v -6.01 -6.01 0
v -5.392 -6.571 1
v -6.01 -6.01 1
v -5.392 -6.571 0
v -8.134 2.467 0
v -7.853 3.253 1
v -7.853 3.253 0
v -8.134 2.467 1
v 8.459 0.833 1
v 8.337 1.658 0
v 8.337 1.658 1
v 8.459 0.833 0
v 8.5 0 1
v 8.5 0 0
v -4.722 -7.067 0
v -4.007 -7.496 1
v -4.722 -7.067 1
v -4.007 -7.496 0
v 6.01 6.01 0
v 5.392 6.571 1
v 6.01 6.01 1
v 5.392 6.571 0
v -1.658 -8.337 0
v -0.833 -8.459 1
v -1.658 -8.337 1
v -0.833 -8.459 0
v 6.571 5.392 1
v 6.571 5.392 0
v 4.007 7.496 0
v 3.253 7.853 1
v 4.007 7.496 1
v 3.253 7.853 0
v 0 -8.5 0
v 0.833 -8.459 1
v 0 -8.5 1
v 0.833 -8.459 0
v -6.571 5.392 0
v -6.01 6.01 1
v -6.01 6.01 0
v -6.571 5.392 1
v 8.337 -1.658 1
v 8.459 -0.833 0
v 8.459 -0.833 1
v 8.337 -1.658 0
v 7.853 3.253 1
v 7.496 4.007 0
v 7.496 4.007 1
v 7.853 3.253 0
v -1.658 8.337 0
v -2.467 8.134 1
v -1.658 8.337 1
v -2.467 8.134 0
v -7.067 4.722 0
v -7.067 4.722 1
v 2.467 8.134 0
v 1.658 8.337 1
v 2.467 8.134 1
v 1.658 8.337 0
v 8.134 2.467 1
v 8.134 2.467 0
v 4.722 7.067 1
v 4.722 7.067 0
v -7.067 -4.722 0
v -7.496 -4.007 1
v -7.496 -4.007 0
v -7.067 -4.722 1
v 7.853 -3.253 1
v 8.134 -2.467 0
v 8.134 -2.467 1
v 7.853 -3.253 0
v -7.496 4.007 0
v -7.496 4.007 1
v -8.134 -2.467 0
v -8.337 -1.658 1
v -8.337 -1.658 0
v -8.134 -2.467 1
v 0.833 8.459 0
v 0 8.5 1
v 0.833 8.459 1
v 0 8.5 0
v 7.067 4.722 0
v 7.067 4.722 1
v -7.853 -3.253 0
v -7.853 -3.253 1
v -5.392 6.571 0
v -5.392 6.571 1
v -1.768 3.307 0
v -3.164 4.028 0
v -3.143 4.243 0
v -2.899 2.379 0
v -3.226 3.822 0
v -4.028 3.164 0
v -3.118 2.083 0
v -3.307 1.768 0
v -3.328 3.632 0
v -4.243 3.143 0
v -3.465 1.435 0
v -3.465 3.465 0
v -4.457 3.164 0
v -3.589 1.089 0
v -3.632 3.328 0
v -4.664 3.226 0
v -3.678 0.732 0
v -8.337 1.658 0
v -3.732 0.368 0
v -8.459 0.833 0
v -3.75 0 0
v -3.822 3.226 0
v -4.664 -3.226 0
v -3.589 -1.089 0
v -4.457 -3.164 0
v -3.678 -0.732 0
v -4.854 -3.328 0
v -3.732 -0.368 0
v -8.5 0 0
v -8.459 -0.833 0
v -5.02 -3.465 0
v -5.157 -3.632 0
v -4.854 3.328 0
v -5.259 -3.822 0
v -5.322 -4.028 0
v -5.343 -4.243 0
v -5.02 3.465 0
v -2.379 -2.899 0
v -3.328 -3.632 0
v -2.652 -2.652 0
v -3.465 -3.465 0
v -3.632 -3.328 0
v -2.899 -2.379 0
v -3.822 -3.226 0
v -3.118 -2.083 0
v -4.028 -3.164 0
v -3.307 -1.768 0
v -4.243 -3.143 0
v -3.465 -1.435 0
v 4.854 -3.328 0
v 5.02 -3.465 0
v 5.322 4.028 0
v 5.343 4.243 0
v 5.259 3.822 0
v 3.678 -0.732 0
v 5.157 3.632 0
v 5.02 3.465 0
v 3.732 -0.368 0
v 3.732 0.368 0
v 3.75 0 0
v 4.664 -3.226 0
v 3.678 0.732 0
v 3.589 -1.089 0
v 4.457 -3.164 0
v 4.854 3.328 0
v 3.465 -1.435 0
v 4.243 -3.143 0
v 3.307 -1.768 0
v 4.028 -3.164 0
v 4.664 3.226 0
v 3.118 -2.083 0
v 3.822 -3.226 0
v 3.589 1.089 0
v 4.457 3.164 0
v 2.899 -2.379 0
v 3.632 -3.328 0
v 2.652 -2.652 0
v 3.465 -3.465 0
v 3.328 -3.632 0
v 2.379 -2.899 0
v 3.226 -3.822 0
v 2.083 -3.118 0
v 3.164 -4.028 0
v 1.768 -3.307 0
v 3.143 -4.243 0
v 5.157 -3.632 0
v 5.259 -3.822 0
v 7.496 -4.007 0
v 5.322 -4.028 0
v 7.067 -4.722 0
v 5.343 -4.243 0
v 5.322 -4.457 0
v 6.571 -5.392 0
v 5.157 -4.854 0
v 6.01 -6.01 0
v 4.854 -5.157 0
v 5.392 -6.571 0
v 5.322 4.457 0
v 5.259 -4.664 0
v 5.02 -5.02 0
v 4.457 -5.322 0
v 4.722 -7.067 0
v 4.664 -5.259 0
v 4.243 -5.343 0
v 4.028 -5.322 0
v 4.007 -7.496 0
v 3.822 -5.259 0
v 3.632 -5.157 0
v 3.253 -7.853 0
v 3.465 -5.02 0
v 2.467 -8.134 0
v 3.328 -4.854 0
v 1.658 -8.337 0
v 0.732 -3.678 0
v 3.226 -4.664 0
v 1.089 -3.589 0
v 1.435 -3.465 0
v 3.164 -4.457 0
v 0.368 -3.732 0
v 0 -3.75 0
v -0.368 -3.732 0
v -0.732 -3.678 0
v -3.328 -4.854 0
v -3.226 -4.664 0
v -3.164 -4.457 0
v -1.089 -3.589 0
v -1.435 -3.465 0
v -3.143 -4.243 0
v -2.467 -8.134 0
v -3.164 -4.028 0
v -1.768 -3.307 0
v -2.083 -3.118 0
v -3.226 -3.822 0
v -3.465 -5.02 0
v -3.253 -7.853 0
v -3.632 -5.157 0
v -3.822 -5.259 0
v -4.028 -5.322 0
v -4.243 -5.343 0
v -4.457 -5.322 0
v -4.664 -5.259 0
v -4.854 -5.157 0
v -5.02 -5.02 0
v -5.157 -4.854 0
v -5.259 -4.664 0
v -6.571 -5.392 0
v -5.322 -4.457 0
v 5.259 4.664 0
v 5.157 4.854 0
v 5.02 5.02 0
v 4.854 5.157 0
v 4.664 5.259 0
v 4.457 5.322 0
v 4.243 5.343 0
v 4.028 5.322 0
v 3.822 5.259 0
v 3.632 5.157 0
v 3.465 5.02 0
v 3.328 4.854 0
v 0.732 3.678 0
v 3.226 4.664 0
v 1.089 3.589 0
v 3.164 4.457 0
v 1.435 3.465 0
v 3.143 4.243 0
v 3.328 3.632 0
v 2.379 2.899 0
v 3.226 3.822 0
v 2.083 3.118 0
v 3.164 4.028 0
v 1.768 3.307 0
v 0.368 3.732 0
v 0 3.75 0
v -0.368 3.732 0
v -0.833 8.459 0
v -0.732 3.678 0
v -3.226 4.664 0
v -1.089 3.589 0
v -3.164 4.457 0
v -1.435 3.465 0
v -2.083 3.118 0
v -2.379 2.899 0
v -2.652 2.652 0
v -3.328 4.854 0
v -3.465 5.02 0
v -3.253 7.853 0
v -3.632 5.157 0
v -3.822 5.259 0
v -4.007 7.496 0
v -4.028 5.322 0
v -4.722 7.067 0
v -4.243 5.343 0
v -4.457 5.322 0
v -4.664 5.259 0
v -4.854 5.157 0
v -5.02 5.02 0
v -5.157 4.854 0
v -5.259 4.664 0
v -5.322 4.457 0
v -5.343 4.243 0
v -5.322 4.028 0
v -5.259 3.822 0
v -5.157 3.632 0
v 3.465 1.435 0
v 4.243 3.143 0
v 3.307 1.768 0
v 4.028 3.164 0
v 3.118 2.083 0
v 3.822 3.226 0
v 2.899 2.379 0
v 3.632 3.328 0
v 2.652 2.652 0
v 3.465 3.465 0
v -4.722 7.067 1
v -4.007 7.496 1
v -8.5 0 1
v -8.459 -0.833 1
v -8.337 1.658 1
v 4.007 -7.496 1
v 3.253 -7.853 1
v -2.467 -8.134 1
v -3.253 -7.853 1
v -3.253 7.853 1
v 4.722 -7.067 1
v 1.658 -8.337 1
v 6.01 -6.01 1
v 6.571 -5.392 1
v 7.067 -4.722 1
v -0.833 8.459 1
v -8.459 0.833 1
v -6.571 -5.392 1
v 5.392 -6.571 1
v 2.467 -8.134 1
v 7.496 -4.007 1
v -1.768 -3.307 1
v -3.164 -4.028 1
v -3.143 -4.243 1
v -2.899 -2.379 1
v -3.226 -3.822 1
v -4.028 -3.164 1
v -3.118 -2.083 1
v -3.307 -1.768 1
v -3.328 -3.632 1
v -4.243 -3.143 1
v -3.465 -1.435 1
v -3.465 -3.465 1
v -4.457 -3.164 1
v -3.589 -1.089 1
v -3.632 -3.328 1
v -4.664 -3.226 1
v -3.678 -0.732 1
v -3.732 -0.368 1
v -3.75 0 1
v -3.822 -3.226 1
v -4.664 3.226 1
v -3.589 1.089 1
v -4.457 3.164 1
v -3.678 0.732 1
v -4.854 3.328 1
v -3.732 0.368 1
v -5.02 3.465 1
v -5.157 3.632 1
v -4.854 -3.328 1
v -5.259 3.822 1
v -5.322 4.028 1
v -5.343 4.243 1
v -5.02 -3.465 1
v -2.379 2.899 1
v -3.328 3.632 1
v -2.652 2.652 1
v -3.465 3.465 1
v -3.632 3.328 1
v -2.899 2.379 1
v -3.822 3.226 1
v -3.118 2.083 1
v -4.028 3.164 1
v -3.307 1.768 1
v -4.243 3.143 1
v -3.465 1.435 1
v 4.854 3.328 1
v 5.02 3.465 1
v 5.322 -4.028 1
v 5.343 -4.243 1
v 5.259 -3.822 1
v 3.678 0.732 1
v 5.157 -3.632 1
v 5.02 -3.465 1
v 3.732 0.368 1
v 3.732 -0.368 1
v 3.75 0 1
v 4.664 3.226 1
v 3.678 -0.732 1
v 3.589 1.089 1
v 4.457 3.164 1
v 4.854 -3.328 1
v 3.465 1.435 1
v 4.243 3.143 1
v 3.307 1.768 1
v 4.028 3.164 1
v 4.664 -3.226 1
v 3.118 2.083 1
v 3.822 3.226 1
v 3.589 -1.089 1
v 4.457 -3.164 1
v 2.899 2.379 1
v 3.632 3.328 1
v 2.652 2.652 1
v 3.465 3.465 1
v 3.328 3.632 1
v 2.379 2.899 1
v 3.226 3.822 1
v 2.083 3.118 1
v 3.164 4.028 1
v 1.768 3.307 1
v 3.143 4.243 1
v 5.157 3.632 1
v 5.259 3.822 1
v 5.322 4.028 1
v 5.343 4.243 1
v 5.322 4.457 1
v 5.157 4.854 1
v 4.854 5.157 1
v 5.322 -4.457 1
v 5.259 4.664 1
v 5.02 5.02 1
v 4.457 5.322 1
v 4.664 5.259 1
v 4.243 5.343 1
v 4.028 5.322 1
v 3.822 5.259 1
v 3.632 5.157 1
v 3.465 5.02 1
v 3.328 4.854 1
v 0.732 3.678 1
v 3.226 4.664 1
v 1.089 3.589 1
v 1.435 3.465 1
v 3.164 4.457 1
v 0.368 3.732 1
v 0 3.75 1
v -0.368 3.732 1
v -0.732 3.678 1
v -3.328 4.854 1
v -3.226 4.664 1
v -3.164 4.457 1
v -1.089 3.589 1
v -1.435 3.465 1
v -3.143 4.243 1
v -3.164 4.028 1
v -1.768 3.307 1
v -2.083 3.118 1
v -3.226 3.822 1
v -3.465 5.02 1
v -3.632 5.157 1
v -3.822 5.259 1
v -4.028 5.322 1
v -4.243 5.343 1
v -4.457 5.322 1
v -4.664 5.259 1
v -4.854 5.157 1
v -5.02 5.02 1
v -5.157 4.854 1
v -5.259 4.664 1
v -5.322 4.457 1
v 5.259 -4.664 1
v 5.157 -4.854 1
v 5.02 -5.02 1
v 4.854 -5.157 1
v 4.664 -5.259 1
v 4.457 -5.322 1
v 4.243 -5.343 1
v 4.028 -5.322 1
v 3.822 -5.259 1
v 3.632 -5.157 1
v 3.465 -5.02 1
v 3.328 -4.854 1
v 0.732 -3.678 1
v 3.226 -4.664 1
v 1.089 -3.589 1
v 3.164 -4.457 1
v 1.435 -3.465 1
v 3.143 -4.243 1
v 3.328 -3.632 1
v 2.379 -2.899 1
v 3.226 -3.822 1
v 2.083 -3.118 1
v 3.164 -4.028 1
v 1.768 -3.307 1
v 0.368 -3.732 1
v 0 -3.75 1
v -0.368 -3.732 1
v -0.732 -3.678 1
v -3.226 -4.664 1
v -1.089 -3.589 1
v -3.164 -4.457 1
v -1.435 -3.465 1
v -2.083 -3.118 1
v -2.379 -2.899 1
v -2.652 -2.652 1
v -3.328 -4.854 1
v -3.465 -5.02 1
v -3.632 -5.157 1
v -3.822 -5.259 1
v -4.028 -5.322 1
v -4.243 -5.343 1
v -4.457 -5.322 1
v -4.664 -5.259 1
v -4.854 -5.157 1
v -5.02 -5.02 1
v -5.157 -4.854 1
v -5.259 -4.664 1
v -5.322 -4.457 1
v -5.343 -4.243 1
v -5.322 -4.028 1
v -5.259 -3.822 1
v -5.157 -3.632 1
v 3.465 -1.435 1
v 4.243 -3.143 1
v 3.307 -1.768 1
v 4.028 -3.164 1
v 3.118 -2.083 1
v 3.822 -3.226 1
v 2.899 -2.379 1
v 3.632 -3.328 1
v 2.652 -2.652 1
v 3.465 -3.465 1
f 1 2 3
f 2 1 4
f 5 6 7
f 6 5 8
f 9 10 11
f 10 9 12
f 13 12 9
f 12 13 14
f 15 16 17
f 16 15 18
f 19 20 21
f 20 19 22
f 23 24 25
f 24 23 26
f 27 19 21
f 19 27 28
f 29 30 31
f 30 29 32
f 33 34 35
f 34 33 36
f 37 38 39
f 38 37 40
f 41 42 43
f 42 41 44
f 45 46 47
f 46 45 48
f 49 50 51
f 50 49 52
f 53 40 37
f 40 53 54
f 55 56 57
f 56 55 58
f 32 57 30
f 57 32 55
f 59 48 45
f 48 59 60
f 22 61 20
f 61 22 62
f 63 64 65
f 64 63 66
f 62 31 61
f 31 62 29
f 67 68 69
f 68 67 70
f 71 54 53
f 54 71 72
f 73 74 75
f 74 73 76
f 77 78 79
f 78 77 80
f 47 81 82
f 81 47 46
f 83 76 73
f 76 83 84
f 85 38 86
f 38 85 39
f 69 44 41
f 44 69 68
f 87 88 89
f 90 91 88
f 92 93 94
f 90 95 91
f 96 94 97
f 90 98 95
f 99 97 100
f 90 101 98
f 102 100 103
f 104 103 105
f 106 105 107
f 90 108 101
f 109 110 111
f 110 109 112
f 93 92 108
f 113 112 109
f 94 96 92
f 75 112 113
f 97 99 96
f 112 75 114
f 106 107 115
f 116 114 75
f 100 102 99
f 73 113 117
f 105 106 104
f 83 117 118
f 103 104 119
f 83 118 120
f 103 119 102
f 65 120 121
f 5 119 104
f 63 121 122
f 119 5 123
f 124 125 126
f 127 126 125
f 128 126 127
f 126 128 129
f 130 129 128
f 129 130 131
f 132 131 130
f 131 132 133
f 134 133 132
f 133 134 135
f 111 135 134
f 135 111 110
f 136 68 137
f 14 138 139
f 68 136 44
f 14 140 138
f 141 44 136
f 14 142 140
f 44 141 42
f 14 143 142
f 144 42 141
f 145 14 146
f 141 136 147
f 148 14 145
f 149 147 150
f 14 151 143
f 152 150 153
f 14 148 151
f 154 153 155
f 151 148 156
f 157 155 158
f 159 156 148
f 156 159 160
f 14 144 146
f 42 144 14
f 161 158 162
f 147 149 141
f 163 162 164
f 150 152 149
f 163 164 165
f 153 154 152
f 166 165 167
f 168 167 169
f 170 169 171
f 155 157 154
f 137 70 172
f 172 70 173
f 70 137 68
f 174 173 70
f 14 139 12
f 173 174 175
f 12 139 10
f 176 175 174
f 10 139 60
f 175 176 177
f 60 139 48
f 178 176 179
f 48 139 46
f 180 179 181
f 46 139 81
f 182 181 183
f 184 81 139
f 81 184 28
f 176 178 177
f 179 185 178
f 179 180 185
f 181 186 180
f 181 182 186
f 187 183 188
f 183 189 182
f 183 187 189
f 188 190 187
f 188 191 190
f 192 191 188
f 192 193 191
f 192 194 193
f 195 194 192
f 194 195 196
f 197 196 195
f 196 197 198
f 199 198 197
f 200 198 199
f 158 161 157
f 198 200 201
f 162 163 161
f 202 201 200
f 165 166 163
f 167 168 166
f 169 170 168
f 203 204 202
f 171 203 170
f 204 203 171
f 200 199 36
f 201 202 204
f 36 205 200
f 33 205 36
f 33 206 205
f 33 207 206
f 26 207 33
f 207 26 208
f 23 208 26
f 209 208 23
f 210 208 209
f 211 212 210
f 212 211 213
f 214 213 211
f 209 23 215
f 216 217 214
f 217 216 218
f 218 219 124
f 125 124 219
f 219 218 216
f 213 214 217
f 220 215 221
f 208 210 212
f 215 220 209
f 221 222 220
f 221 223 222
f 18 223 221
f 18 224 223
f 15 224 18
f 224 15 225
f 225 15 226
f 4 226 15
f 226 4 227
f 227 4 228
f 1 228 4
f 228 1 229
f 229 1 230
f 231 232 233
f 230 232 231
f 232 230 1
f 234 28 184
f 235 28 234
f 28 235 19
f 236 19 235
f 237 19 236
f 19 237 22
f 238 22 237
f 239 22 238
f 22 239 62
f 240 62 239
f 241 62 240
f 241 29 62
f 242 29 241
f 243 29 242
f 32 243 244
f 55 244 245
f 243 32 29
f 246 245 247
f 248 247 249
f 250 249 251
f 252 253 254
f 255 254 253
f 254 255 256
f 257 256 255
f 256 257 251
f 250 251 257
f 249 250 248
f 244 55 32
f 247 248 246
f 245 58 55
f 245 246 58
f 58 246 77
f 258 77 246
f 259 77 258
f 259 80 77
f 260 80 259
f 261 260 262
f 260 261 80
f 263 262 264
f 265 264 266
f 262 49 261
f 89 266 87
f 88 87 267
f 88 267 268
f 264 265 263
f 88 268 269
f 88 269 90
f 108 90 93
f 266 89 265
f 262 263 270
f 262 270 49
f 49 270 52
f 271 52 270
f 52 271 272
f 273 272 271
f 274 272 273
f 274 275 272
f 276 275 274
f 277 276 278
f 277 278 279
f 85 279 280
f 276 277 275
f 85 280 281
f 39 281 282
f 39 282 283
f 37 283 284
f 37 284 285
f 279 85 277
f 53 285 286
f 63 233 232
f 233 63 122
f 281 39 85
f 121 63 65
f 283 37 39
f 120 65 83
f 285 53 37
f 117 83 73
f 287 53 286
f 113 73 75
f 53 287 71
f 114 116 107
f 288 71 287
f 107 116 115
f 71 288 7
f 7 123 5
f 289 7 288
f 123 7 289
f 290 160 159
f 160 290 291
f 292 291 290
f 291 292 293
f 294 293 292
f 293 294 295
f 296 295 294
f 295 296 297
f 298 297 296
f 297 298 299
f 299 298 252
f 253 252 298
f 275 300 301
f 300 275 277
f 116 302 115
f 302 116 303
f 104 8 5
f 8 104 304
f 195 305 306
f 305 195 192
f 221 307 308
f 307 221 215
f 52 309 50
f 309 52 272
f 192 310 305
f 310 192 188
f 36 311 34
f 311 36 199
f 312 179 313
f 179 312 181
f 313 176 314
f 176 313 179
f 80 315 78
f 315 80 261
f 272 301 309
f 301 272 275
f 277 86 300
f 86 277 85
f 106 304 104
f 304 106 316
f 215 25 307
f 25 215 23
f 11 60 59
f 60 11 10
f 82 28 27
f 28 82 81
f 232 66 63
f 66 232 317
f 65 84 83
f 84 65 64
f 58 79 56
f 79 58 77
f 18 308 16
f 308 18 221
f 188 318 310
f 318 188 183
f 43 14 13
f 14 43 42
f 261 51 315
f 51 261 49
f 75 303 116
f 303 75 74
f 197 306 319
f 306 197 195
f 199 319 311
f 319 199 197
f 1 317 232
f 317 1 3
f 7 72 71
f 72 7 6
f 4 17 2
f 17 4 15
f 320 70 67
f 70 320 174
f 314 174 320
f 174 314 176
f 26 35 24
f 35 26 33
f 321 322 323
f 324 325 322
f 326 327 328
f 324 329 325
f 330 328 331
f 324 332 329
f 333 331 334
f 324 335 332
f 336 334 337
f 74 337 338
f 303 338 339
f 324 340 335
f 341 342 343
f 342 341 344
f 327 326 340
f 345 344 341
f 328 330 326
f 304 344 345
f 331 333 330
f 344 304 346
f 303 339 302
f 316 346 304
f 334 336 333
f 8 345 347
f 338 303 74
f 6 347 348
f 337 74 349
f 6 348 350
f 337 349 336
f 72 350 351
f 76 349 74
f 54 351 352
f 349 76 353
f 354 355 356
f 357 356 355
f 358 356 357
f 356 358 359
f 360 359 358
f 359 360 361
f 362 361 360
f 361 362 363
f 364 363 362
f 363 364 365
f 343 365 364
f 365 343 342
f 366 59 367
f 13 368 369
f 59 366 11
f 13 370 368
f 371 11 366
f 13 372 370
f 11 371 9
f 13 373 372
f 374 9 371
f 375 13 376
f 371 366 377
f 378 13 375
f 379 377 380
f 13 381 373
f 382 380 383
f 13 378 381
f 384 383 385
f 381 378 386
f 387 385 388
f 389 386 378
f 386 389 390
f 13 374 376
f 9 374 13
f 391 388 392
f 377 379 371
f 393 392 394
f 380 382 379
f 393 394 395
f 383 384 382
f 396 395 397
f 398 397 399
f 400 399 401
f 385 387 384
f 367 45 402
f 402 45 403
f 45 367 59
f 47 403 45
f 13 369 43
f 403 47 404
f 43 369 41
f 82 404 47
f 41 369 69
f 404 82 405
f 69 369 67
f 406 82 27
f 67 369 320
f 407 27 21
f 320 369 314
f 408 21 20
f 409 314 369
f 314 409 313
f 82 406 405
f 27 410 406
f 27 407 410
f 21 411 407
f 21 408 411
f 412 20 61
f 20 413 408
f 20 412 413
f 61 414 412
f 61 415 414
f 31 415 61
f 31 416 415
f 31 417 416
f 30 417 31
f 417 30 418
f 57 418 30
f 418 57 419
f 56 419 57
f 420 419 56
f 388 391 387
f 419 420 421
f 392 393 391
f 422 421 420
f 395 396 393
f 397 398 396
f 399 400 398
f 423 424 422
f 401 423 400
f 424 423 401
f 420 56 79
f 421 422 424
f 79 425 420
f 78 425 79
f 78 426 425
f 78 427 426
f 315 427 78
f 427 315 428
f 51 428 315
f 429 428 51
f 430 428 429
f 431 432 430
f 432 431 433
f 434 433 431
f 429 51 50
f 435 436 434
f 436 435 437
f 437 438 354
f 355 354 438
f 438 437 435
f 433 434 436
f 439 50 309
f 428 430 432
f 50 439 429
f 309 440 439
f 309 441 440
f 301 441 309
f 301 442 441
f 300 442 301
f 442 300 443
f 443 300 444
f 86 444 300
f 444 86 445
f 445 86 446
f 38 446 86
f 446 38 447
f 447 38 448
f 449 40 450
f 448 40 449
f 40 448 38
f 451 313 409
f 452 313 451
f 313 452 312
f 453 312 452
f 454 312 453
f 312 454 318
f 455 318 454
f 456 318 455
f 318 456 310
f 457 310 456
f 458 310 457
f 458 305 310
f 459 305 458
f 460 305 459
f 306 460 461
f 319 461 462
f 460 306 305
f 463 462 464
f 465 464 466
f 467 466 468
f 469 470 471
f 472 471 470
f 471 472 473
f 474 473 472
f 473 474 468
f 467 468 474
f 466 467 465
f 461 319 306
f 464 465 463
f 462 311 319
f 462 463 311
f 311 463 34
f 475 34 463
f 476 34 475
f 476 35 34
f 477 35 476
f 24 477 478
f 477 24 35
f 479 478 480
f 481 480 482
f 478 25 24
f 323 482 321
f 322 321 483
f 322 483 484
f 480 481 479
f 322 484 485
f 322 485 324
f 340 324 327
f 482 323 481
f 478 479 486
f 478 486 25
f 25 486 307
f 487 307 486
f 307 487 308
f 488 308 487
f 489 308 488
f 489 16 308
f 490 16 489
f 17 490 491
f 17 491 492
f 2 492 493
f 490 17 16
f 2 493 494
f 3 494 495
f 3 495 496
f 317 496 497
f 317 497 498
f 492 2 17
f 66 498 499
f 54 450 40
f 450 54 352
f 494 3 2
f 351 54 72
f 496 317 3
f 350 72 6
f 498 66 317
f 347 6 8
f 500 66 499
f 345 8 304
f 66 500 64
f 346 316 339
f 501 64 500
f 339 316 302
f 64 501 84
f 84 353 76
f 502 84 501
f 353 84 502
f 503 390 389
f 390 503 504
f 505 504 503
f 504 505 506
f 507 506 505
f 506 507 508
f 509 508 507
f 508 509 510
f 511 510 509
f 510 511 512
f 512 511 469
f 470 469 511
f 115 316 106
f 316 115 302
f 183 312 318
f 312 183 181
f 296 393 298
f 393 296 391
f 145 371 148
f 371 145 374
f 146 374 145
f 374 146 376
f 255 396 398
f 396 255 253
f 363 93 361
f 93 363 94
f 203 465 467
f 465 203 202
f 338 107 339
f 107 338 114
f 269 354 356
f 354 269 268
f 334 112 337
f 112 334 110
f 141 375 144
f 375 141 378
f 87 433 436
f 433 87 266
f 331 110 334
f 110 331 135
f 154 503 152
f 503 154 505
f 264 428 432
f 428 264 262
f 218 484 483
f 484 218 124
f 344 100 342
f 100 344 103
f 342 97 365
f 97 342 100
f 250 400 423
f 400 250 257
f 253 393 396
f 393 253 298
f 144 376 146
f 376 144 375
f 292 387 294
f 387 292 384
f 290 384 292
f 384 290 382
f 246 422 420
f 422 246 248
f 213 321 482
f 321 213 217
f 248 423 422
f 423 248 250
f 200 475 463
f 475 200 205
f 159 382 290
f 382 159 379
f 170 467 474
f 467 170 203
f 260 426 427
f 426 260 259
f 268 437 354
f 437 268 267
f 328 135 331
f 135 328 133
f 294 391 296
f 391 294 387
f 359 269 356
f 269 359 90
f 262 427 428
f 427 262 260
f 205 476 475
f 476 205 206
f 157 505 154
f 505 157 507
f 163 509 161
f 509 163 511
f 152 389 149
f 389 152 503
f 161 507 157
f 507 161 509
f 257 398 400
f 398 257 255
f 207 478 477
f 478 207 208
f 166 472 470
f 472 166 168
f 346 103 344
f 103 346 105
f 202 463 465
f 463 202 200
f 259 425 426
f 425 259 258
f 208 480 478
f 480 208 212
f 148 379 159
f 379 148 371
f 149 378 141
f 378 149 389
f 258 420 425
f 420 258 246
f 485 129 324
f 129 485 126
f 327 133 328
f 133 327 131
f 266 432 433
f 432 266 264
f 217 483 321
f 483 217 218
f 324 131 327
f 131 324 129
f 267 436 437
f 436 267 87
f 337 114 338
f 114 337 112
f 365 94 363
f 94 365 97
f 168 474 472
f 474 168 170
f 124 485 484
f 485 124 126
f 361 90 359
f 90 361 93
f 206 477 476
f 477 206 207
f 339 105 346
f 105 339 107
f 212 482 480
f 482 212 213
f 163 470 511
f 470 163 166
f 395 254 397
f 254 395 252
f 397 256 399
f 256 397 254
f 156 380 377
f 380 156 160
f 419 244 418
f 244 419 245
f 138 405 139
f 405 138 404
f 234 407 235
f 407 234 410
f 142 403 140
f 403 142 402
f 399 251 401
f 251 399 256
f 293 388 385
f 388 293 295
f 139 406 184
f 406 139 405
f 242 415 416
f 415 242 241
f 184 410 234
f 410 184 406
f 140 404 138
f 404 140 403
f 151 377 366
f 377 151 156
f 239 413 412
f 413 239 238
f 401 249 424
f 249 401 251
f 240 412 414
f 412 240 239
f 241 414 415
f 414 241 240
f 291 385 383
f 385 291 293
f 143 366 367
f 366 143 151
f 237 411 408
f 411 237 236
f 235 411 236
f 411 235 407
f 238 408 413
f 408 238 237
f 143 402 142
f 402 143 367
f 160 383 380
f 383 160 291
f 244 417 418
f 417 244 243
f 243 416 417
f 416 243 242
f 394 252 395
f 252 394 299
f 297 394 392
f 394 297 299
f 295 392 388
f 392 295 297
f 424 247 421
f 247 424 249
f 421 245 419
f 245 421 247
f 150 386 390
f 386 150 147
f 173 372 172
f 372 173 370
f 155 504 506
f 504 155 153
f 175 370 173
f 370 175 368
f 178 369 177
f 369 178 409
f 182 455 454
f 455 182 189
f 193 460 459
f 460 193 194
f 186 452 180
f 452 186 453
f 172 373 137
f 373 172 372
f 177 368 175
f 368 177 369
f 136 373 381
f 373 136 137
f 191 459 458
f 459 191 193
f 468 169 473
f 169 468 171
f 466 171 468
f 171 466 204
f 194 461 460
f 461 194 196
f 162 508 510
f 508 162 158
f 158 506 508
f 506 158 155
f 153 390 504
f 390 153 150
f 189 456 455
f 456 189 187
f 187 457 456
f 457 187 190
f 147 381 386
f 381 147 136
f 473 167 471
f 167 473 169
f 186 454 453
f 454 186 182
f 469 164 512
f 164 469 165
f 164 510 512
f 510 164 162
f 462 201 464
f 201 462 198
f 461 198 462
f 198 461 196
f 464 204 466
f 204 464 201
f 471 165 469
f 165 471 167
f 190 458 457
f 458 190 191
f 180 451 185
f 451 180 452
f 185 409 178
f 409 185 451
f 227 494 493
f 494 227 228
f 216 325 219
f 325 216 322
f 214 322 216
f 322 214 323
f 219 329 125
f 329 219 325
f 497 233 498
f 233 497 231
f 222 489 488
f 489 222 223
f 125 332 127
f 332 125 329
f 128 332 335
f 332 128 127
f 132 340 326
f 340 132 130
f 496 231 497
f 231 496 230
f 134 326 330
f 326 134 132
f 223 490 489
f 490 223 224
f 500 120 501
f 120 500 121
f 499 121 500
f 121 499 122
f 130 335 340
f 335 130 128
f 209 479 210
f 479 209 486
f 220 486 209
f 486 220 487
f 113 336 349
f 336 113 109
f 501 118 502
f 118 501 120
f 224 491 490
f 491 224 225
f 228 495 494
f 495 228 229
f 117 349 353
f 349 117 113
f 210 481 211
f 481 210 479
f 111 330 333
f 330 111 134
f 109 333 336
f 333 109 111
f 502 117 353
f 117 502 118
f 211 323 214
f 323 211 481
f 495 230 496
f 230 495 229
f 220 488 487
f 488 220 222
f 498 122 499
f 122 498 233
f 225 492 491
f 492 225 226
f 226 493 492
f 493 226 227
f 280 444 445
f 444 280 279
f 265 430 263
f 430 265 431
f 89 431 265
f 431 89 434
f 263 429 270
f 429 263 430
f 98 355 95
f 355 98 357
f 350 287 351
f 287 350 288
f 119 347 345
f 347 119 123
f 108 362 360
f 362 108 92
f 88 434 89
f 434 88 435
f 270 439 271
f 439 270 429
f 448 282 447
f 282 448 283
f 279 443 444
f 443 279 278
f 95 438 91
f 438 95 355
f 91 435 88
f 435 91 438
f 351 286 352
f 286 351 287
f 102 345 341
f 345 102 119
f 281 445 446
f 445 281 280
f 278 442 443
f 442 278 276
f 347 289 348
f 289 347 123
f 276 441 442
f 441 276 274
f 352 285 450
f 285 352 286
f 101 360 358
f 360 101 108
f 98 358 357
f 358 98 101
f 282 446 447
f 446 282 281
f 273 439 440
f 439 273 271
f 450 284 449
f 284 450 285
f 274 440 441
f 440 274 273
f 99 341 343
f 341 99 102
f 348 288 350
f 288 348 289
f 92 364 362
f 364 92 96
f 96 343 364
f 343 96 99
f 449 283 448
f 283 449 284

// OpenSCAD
spacer_thickness = 1;
hole_circle = 12;
hole_offset = cos(45) * (hole_circle/2);

$fn = 64;

module spacer_body() {
    difference() {
        // outer ring
        cylinder(d = 17, h = spacer_thickness);
        cylinder(d = 7.5, h = spacer_thickness);
    }
}
    

module screw_holes() {
    translate([hole_offset, hole_offset, 0]) cylinder(d = 2.2, h = spacer_thickness, $fn = 32);
    translate([hole_offset, -hole_offset, 0]) cylinder(d = 2.2, h = spacer_thickness, $fn = 32);
    translate([-hole_offset, -hole_offset, 0]) cylinder(d = 2.2, h = spacer_thickness, $fn = 32);
    translate([-hole_offset, hole_offset, 0]) cylinder(d = 2.2, h = spacer_thickness, $fn = 32);
}

module weight_reduction_slot() {
    for (angle = [65:1:115]) { 
        translate([cos(angle) * hole_circle / 2, sin(angle) * hole_circle / 2, -0.1]) cylinder(d = 1.5 , h = spacer_thickness + 0.2, $fn = 32);
    }
}

module weight_reduction() {
    weight_reduction_slot();
    rotate([0, 0, 90]) weight_reduction_slot();
    rotate([0, 0, 180]) weight_reduction_slot();
    rotate([0, 0, 270]) weight_reduction_slot();
}

difference() {
    spacer_body();
    screw_holes();
    //weight_reduction();
}
